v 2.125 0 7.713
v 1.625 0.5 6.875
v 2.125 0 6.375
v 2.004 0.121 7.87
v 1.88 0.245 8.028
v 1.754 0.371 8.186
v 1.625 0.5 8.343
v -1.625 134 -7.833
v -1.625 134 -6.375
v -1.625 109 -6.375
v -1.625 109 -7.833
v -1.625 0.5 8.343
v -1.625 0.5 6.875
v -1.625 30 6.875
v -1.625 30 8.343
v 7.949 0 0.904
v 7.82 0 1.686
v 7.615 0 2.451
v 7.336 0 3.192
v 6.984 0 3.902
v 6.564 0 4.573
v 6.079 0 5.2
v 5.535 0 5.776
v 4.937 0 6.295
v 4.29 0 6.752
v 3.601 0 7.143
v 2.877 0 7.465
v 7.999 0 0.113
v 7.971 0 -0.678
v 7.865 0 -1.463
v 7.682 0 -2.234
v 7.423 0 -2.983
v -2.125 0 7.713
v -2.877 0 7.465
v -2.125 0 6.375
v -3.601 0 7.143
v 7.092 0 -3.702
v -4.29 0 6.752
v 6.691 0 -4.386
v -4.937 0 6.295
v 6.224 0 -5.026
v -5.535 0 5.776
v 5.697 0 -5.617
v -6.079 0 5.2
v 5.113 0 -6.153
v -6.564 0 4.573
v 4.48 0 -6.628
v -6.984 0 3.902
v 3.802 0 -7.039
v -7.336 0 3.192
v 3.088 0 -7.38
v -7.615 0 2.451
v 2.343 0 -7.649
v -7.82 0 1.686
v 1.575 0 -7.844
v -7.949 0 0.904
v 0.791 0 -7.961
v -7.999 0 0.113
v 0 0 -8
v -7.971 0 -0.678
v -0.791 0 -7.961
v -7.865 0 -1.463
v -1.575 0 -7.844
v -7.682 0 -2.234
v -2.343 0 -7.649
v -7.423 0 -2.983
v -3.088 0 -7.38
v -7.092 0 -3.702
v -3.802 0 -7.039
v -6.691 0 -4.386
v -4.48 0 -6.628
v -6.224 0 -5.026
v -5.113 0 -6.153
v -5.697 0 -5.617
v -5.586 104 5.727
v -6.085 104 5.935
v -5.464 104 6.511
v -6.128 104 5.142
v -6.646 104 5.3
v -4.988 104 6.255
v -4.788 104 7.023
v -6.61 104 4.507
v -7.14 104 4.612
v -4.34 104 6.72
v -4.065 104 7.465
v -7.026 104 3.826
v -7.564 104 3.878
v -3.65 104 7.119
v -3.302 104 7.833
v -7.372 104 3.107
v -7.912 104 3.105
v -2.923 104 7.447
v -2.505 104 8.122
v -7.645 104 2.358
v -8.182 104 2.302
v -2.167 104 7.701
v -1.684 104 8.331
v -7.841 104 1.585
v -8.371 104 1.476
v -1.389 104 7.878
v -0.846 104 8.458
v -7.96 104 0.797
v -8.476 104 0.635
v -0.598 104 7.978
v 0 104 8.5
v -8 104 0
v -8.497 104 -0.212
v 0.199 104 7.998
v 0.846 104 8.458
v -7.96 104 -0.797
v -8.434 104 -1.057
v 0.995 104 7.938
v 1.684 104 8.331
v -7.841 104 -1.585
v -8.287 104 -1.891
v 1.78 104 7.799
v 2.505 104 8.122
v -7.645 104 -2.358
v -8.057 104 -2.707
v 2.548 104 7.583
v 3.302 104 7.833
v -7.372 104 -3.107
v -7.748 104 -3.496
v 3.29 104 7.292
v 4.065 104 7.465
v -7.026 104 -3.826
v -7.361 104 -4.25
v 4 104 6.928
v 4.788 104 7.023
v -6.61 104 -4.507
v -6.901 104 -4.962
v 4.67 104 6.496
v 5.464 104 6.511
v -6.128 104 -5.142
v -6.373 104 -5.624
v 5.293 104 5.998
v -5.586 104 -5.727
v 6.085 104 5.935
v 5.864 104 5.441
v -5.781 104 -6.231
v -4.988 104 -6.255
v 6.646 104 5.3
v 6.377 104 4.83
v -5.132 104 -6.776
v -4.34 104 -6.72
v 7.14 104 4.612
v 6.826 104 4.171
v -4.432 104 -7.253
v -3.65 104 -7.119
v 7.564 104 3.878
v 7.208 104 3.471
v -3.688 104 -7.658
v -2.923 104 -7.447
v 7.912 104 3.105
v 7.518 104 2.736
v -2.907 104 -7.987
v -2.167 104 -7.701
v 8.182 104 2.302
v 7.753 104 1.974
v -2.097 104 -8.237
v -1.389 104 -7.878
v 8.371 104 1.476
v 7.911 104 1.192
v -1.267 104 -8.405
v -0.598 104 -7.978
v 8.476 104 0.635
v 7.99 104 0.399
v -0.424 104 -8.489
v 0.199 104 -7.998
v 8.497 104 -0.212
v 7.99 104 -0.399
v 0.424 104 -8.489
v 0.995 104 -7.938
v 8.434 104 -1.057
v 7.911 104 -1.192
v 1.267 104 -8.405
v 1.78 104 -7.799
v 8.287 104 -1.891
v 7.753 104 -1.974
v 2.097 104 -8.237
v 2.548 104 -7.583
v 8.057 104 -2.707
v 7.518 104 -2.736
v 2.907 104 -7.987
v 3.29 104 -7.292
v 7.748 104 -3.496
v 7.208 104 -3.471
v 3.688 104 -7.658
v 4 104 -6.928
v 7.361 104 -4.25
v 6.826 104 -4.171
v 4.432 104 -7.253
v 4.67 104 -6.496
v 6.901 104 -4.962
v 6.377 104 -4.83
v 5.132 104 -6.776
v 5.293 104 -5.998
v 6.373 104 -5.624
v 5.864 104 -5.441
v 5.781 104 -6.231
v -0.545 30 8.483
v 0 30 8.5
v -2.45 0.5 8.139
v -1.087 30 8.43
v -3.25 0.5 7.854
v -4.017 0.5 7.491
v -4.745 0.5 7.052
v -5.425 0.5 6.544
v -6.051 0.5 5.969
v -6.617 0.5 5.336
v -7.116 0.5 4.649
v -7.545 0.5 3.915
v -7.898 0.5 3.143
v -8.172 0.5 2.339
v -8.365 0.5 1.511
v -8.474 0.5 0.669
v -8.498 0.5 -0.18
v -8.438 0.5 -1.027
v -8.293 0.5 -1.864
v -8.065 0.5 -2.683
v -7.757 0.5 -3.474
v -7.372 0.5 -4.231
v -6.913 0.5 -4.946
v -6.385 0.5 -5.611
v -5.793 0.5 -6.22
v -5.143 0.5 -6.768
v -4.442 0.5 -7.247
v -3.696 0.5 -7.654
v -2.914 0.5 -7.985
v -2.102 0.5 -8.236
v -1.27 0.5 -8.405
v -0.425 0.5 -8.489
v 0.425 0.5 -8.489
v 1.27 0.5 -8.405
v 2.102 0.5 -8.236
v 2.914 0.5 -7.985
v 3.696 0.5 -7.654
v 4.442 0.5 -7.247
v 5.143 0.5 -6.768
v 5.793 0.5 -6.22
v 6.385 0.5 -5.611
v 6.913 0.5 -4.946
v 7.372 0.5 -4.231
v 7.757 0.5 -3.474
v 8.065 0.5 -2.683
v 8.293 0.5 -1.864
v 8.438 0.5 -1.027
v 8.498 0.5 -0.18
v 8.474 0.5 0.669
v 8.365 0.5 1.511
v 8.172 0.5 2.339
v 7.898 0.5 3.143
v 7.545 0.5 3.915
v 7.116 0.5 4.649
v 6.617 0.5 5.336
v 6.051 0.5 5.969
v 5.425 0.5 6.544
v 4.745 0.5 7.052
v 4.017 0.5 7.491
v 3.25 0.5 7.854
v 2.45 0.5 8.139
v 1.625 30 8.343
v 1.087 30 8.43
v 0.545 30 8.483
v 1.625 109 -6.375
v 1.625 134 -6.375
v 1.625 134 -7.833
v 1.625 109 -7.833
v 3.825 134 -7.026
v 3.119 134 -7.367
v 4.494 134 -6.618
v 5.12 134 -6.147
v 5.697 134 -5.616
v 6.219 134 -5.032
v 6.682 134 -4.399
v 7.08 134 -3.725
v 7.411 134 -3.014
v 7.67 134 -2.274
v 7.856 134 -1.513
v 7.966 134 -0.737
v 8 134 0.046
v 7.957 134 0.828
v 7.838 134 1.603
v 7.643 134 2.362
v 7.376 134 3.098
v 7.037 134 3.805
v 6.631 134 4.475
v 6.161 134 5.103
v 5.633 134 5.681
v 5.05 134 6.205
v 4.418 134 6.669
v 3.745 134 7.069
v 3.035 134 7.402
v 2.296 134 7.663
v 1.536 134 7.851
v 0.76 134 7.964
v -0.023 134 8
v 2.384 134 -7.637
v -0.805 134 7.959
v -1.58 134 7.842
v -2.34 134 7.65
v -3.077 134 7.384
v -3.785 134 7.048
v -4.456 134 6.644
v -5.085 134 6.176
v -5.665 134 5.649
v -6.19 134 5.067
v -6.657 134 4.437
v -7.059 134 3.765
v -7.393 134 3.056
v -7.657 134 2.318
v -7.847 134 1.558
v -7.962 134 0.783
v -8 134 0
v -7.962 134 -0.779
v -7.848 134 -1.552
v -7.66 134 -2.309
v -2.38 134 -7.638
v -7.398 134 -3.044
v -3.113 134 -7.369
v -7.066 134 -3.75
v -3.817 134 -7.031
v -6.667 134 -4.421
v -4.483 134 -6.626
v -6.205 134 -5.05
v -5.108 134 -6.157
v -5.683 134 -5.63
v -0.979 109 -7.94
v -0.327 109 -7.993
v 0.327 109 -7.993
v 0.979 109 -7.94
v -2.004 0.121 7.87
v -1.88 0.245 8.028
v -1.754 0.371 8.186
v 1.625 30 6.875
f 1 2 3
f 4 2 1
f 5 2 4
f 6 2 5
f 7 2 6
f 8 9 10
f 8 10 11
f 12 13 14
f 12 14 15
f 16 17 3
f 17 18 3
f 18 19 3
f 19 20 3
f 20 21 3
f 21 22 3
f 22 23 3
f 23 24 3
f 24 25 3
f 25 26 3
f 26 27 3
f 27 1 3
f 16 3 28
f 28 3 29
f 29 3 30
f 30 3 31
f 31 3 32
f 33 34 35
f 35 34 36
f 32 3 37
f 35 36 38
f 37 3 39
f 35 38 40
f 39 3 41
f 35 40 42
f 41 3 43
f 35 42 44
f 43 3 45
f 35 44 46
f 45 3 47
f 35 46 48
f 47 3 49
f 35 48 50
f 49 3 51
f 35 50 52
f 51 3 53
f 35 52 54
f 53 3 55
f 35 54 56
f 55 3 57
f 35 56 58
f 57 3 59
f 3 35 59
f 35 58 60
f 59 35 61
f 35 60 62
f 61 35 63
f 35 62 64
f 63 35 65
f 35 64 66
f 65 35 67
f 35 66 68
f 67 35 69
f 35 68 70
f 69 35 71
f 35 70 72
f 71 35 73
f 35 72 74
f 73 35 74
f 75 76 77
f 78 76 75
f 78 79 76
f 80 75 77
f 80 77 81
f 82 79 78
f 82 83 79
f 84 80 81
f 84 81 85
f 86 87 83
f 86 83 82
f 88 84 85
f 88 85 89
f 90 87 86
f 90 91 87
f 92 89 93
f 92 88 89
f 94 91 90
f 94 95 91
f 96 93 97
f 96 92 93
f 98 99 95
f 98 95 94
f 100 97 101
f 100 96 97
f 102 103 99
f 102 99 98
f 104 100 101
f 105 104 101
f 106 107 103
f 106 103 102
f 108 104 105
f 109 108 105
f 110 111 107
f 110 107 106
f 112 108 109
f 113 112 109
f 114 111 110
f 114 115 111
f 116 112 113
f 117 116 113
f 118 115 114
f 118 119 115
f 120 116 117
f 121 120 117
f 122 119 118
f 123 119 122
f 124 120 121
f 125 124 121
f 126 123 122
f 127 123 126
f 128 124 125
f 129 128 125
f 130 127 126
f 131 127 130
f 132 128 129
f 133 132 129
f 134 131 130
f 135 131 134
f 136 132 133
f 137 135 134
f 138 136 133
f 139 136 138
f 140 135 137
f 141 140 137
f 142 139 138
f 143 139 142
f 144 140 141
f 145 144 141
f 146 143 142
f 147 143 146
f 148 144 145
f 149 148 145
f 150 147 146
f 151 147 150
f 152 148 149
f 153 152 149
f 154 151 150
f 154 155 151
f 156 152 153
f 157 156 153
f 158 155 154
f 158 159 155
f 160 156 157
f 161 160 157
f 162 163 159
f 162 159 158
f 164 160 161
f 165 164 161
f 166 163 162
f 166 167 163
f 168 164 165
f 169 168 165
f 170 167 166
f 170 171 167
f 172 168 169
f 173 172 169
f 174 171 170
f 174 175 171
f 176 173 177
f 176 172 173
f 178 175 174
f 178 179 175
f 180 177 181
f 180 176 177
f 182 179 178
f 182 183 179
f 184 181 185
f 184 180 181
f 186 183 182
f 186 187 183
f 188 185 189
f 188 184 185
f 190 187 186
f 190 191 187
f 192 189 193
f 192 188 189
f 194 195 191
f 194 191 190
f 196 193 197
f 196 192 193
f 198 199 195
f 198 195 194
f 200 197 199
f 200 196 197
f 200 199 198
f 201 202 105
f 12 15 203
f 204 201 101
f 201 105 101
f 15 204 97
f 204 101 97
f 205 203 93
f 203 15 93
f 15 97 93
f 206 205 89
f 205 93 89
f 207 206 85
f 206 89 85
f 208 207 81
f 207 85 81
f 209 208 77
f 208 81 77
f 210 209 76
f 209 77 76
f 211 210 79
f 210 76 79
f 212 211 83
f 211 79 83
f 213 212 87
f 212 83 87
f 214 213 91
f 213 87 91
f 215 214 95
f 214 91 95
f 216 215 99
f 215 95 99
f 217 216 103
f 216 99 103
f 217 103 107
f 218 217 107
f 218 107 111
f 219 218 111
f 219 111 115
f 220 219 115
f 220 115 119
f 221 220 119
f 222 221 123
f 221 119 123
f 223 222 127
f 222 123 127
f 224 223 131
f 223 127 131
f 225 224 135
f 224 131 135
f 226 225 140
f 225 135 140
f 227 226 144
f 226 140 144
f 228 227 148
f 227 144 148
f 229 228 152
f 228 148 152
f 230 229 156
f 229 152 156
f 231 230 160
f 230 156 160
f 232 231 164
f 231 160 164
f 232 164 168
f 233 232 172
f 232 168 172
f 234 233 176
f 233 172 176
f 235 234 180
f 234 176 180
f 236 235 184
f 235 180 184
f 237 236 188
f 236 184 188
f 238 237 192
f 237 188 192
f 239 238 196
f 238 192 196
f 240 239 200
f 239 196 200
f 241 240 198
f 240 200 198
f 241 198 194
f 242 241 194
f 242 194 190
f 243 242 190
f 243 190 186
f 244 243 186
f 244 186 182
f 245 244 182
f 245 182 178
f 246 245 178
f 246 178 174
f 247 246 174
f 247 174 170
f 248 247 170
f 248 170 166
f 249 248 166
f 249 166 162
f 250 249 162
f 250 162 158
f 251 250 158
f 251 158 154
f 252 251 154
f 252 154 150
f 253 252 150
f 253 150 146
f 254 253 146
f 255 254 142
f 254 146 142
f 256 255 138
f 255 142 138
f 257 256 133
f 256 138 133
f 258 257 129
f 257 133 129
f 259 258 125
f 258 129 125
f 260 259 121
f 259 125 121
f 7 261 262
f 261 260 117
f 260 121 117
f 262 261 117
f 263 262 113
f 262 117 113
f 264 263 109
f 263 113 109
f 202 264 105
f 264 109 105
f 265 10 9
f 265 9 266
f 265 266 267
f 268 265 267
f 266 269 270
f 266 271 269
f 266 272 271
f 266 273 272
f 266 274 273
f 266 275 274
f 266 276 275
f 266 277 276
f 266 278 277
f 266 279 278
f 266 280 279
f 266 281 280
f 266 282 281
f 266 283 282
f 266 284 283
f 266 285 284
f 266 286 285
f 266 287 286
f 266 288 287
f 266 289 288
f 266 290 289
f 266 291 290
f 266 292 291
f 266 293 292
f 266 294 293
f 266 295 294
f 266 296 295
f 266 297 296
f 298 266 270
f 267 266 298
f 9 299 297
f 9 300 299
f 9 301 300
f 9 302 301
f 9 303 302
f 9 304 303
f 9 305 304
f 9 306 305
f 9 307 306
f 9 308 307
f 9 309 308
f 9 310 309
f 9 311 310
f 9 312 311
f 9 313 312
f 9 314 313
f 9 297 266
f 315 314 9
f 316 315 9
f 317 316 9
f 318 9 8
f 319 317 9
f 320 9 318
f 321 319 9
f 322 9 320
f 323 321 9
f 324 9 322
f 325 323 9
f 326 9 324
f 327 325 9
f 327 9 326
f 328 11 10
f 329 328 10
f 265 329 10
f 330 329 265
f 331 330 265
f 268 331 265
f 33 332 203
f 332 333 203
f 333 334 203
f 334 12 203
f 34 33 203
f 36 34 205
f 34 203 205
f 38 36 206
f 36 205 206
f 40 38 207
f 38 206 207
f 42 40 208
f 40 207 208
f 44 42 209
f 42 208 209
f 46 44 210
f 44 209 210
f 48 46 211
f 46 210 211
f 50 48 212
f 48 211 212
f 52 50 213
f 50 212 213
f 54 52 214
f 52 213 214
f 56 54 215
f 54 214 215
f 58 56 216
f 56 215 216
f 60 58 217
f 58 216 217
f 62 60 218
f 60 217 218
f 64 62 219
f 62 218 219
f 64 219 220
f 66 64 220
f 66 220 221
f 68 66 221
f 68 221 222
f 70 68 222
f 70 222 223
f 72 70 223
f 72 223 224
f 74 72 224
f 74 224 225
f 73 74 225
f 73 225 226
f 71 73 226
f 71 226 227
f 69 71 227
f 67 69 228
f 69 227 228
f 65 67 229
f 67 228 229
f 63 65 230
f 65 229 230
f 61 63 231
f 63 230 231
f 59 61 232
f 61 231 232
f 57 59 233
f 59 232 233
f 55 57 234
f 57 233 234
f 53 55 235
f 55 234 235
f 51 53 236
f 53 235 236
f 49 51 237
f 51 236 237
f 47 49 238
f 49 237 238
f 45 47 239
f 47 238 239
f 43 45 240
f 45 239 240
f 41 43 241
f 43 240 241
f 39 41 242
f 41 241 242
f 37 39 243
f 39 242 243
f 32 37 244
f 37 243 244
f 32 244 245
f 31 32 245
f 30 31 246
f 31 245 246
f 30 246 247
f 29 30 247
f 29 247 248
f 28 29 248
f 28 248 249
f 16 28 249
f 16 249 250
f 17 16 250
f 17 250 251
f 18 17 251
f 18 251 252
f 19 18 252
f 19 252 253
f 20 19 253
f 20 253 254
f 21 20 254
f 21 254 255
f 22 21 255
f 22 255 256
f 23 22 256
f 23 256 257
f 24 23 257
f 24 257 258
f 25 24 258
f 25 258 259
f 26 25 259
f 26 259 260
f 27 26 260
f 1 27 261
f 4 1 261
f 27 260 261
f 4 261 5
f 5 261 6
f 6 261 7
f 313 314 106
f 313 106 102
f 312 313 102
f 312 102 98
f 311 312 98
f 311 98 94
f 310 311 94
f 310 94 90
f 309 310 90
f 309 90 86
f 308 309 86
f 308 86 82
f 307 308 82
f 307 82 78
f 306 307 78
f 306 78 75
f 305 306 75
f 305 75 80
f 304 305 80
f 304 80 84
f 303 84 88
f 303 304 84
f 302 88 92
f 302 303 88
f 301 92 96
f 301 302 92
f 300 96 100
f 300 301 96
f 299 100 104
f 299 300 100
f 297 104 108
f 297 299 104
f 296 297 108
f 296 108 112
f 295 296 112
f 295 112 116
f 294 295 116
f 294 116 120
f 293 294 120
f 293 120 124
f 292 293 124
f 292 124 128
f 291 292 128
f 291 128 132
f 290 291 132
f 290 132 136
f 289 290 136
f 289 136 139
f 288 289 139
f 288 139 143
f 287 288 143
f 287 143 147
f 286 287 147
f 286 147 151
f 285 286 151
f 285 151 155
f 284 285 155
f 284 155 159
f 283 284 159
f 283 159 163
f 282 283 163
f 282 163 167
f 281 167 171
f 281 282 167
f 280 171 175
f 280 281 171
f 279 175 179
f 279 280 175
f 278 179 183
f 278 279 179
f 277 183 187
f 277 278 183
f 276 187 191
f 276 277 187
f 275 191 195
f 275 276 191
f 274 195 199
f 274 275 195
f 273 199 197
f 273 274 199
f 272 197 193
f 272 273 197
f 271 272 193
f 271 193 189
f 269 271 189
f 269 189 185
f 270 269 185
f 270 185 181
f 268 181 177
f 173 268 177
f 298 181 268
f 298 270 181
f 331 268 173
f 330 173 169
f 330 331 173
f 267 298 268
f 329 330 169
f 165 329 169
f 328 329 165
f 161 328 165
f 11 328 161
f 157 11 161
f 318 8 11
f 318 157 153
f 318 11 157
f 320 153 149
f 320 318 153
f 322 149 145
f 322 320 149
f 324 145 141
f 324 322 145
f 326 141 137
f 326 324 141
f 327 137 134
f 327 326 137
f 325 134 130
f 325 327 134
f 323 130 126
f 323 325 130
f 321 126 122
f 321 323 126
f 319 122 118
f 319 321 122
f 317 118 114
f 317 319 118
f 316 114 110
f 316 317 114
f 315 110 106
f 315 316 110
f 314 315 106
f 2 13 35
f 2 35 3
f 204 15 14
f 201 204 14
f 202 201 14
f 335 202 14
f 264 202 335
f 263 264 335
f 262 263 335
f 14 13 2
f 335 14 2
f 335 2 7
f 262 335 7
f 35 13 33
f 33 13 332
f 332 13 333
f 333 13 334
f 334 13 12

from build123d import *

# Parameters (mm, degrees)
SKETCH1_W          = 8.5
SKETCH1_H          = 134
SKETCH2_W          = 3.25
SKETCH2_H          = 3.25
CUT_EXTRUDE1_DEPTH = 30
CHAMFER1_SIZE      = 0.5
SKETCH4_OUTSIDE_W  = 46.228
SKETCH4_OUTSIDE_H  = 46.228
SKETCH4_OUTSIDE_R  = 8
CUT_EXTRUDE3_DEPTH = 30
SKETCH3_W          = 3.25
SKETCH3_H          = 3.25
CUT_EXTRUDE2_DEPTH = 25


with BuildPart() as part:
    # Sketch1 → Revolve1 (revolve)
    with BuildSketch(Plane.XY, mode=Mode.PRIVATE) as revolve1_sk:
        with Locations((4.25, 67)):
            Rectangle(SKETCH1_W, SKETCH1_H)
    revolve(revolve1_sk.sketch.rotate(Axis((0, 134, 0), (0, -1, 0)), 90), axis=Axis((0, 134, 0), (0, -1, 0)))

    # Sketch2 → Cut-Extrude1 (cut)
    with BuildSketch(Plane.XZ):
        with Locations((0, 8.5)):
            Rectangle(SKETCH2_W, SKETCH2_H)
    extrude(amount=-CUT_EXTRUDE1_DEPTH, mode=Mode.SUBTRACT)

    # Chamfer1
    chamfer1_edges = [part.edges().sort_by_distance(p)[0] for p in [
        (1.625, 0, 7.609111649),
        (0, 0, 6.875),
        (0, 0, -8.5),
        (0, 134, -8.5),
        (-1.625, 0, 7.609111649),
    ]]
    chamfer(chamfer1_edges, length=CHAMFER1_SIZE)

    # Sketch4 outside → Cut-Extrude3 (cut)
    with BuildSketch(Plane(origin=(0, 134, 0), x_dir=(1, 0, 0), z_dir=(0, 1, 0))):
        Rectangle(SKETCH4_OUTSIDE_W, SKETCH4_OUTSIDE_H)
        with Locations(Location((0, 0, 0), (0, 0, 180))):
            Circle(SKETCH4_OUTSIDE_R, mode=Mode.SUBTRACT)
    extrude(amount=-CUT_EXTRUDE3_DEPTH, mode=Mode.SUBTRACT)

    # Sketch3 → Cut-Extrude2 (cut)
    with BuildSketch(Plane(origin=(0, 134, 0), x_dir=(1, 0, 0), z_dir=(0, 1, 0))):
        with Locations((0, 8)):
            Rectangle(SKETCH3_W, SKETCH3_H)
    extrude(amount=-CUT_EXTRUDE2_DEPTH, mode=Mode.SUBTRACT)


solid = part.part
